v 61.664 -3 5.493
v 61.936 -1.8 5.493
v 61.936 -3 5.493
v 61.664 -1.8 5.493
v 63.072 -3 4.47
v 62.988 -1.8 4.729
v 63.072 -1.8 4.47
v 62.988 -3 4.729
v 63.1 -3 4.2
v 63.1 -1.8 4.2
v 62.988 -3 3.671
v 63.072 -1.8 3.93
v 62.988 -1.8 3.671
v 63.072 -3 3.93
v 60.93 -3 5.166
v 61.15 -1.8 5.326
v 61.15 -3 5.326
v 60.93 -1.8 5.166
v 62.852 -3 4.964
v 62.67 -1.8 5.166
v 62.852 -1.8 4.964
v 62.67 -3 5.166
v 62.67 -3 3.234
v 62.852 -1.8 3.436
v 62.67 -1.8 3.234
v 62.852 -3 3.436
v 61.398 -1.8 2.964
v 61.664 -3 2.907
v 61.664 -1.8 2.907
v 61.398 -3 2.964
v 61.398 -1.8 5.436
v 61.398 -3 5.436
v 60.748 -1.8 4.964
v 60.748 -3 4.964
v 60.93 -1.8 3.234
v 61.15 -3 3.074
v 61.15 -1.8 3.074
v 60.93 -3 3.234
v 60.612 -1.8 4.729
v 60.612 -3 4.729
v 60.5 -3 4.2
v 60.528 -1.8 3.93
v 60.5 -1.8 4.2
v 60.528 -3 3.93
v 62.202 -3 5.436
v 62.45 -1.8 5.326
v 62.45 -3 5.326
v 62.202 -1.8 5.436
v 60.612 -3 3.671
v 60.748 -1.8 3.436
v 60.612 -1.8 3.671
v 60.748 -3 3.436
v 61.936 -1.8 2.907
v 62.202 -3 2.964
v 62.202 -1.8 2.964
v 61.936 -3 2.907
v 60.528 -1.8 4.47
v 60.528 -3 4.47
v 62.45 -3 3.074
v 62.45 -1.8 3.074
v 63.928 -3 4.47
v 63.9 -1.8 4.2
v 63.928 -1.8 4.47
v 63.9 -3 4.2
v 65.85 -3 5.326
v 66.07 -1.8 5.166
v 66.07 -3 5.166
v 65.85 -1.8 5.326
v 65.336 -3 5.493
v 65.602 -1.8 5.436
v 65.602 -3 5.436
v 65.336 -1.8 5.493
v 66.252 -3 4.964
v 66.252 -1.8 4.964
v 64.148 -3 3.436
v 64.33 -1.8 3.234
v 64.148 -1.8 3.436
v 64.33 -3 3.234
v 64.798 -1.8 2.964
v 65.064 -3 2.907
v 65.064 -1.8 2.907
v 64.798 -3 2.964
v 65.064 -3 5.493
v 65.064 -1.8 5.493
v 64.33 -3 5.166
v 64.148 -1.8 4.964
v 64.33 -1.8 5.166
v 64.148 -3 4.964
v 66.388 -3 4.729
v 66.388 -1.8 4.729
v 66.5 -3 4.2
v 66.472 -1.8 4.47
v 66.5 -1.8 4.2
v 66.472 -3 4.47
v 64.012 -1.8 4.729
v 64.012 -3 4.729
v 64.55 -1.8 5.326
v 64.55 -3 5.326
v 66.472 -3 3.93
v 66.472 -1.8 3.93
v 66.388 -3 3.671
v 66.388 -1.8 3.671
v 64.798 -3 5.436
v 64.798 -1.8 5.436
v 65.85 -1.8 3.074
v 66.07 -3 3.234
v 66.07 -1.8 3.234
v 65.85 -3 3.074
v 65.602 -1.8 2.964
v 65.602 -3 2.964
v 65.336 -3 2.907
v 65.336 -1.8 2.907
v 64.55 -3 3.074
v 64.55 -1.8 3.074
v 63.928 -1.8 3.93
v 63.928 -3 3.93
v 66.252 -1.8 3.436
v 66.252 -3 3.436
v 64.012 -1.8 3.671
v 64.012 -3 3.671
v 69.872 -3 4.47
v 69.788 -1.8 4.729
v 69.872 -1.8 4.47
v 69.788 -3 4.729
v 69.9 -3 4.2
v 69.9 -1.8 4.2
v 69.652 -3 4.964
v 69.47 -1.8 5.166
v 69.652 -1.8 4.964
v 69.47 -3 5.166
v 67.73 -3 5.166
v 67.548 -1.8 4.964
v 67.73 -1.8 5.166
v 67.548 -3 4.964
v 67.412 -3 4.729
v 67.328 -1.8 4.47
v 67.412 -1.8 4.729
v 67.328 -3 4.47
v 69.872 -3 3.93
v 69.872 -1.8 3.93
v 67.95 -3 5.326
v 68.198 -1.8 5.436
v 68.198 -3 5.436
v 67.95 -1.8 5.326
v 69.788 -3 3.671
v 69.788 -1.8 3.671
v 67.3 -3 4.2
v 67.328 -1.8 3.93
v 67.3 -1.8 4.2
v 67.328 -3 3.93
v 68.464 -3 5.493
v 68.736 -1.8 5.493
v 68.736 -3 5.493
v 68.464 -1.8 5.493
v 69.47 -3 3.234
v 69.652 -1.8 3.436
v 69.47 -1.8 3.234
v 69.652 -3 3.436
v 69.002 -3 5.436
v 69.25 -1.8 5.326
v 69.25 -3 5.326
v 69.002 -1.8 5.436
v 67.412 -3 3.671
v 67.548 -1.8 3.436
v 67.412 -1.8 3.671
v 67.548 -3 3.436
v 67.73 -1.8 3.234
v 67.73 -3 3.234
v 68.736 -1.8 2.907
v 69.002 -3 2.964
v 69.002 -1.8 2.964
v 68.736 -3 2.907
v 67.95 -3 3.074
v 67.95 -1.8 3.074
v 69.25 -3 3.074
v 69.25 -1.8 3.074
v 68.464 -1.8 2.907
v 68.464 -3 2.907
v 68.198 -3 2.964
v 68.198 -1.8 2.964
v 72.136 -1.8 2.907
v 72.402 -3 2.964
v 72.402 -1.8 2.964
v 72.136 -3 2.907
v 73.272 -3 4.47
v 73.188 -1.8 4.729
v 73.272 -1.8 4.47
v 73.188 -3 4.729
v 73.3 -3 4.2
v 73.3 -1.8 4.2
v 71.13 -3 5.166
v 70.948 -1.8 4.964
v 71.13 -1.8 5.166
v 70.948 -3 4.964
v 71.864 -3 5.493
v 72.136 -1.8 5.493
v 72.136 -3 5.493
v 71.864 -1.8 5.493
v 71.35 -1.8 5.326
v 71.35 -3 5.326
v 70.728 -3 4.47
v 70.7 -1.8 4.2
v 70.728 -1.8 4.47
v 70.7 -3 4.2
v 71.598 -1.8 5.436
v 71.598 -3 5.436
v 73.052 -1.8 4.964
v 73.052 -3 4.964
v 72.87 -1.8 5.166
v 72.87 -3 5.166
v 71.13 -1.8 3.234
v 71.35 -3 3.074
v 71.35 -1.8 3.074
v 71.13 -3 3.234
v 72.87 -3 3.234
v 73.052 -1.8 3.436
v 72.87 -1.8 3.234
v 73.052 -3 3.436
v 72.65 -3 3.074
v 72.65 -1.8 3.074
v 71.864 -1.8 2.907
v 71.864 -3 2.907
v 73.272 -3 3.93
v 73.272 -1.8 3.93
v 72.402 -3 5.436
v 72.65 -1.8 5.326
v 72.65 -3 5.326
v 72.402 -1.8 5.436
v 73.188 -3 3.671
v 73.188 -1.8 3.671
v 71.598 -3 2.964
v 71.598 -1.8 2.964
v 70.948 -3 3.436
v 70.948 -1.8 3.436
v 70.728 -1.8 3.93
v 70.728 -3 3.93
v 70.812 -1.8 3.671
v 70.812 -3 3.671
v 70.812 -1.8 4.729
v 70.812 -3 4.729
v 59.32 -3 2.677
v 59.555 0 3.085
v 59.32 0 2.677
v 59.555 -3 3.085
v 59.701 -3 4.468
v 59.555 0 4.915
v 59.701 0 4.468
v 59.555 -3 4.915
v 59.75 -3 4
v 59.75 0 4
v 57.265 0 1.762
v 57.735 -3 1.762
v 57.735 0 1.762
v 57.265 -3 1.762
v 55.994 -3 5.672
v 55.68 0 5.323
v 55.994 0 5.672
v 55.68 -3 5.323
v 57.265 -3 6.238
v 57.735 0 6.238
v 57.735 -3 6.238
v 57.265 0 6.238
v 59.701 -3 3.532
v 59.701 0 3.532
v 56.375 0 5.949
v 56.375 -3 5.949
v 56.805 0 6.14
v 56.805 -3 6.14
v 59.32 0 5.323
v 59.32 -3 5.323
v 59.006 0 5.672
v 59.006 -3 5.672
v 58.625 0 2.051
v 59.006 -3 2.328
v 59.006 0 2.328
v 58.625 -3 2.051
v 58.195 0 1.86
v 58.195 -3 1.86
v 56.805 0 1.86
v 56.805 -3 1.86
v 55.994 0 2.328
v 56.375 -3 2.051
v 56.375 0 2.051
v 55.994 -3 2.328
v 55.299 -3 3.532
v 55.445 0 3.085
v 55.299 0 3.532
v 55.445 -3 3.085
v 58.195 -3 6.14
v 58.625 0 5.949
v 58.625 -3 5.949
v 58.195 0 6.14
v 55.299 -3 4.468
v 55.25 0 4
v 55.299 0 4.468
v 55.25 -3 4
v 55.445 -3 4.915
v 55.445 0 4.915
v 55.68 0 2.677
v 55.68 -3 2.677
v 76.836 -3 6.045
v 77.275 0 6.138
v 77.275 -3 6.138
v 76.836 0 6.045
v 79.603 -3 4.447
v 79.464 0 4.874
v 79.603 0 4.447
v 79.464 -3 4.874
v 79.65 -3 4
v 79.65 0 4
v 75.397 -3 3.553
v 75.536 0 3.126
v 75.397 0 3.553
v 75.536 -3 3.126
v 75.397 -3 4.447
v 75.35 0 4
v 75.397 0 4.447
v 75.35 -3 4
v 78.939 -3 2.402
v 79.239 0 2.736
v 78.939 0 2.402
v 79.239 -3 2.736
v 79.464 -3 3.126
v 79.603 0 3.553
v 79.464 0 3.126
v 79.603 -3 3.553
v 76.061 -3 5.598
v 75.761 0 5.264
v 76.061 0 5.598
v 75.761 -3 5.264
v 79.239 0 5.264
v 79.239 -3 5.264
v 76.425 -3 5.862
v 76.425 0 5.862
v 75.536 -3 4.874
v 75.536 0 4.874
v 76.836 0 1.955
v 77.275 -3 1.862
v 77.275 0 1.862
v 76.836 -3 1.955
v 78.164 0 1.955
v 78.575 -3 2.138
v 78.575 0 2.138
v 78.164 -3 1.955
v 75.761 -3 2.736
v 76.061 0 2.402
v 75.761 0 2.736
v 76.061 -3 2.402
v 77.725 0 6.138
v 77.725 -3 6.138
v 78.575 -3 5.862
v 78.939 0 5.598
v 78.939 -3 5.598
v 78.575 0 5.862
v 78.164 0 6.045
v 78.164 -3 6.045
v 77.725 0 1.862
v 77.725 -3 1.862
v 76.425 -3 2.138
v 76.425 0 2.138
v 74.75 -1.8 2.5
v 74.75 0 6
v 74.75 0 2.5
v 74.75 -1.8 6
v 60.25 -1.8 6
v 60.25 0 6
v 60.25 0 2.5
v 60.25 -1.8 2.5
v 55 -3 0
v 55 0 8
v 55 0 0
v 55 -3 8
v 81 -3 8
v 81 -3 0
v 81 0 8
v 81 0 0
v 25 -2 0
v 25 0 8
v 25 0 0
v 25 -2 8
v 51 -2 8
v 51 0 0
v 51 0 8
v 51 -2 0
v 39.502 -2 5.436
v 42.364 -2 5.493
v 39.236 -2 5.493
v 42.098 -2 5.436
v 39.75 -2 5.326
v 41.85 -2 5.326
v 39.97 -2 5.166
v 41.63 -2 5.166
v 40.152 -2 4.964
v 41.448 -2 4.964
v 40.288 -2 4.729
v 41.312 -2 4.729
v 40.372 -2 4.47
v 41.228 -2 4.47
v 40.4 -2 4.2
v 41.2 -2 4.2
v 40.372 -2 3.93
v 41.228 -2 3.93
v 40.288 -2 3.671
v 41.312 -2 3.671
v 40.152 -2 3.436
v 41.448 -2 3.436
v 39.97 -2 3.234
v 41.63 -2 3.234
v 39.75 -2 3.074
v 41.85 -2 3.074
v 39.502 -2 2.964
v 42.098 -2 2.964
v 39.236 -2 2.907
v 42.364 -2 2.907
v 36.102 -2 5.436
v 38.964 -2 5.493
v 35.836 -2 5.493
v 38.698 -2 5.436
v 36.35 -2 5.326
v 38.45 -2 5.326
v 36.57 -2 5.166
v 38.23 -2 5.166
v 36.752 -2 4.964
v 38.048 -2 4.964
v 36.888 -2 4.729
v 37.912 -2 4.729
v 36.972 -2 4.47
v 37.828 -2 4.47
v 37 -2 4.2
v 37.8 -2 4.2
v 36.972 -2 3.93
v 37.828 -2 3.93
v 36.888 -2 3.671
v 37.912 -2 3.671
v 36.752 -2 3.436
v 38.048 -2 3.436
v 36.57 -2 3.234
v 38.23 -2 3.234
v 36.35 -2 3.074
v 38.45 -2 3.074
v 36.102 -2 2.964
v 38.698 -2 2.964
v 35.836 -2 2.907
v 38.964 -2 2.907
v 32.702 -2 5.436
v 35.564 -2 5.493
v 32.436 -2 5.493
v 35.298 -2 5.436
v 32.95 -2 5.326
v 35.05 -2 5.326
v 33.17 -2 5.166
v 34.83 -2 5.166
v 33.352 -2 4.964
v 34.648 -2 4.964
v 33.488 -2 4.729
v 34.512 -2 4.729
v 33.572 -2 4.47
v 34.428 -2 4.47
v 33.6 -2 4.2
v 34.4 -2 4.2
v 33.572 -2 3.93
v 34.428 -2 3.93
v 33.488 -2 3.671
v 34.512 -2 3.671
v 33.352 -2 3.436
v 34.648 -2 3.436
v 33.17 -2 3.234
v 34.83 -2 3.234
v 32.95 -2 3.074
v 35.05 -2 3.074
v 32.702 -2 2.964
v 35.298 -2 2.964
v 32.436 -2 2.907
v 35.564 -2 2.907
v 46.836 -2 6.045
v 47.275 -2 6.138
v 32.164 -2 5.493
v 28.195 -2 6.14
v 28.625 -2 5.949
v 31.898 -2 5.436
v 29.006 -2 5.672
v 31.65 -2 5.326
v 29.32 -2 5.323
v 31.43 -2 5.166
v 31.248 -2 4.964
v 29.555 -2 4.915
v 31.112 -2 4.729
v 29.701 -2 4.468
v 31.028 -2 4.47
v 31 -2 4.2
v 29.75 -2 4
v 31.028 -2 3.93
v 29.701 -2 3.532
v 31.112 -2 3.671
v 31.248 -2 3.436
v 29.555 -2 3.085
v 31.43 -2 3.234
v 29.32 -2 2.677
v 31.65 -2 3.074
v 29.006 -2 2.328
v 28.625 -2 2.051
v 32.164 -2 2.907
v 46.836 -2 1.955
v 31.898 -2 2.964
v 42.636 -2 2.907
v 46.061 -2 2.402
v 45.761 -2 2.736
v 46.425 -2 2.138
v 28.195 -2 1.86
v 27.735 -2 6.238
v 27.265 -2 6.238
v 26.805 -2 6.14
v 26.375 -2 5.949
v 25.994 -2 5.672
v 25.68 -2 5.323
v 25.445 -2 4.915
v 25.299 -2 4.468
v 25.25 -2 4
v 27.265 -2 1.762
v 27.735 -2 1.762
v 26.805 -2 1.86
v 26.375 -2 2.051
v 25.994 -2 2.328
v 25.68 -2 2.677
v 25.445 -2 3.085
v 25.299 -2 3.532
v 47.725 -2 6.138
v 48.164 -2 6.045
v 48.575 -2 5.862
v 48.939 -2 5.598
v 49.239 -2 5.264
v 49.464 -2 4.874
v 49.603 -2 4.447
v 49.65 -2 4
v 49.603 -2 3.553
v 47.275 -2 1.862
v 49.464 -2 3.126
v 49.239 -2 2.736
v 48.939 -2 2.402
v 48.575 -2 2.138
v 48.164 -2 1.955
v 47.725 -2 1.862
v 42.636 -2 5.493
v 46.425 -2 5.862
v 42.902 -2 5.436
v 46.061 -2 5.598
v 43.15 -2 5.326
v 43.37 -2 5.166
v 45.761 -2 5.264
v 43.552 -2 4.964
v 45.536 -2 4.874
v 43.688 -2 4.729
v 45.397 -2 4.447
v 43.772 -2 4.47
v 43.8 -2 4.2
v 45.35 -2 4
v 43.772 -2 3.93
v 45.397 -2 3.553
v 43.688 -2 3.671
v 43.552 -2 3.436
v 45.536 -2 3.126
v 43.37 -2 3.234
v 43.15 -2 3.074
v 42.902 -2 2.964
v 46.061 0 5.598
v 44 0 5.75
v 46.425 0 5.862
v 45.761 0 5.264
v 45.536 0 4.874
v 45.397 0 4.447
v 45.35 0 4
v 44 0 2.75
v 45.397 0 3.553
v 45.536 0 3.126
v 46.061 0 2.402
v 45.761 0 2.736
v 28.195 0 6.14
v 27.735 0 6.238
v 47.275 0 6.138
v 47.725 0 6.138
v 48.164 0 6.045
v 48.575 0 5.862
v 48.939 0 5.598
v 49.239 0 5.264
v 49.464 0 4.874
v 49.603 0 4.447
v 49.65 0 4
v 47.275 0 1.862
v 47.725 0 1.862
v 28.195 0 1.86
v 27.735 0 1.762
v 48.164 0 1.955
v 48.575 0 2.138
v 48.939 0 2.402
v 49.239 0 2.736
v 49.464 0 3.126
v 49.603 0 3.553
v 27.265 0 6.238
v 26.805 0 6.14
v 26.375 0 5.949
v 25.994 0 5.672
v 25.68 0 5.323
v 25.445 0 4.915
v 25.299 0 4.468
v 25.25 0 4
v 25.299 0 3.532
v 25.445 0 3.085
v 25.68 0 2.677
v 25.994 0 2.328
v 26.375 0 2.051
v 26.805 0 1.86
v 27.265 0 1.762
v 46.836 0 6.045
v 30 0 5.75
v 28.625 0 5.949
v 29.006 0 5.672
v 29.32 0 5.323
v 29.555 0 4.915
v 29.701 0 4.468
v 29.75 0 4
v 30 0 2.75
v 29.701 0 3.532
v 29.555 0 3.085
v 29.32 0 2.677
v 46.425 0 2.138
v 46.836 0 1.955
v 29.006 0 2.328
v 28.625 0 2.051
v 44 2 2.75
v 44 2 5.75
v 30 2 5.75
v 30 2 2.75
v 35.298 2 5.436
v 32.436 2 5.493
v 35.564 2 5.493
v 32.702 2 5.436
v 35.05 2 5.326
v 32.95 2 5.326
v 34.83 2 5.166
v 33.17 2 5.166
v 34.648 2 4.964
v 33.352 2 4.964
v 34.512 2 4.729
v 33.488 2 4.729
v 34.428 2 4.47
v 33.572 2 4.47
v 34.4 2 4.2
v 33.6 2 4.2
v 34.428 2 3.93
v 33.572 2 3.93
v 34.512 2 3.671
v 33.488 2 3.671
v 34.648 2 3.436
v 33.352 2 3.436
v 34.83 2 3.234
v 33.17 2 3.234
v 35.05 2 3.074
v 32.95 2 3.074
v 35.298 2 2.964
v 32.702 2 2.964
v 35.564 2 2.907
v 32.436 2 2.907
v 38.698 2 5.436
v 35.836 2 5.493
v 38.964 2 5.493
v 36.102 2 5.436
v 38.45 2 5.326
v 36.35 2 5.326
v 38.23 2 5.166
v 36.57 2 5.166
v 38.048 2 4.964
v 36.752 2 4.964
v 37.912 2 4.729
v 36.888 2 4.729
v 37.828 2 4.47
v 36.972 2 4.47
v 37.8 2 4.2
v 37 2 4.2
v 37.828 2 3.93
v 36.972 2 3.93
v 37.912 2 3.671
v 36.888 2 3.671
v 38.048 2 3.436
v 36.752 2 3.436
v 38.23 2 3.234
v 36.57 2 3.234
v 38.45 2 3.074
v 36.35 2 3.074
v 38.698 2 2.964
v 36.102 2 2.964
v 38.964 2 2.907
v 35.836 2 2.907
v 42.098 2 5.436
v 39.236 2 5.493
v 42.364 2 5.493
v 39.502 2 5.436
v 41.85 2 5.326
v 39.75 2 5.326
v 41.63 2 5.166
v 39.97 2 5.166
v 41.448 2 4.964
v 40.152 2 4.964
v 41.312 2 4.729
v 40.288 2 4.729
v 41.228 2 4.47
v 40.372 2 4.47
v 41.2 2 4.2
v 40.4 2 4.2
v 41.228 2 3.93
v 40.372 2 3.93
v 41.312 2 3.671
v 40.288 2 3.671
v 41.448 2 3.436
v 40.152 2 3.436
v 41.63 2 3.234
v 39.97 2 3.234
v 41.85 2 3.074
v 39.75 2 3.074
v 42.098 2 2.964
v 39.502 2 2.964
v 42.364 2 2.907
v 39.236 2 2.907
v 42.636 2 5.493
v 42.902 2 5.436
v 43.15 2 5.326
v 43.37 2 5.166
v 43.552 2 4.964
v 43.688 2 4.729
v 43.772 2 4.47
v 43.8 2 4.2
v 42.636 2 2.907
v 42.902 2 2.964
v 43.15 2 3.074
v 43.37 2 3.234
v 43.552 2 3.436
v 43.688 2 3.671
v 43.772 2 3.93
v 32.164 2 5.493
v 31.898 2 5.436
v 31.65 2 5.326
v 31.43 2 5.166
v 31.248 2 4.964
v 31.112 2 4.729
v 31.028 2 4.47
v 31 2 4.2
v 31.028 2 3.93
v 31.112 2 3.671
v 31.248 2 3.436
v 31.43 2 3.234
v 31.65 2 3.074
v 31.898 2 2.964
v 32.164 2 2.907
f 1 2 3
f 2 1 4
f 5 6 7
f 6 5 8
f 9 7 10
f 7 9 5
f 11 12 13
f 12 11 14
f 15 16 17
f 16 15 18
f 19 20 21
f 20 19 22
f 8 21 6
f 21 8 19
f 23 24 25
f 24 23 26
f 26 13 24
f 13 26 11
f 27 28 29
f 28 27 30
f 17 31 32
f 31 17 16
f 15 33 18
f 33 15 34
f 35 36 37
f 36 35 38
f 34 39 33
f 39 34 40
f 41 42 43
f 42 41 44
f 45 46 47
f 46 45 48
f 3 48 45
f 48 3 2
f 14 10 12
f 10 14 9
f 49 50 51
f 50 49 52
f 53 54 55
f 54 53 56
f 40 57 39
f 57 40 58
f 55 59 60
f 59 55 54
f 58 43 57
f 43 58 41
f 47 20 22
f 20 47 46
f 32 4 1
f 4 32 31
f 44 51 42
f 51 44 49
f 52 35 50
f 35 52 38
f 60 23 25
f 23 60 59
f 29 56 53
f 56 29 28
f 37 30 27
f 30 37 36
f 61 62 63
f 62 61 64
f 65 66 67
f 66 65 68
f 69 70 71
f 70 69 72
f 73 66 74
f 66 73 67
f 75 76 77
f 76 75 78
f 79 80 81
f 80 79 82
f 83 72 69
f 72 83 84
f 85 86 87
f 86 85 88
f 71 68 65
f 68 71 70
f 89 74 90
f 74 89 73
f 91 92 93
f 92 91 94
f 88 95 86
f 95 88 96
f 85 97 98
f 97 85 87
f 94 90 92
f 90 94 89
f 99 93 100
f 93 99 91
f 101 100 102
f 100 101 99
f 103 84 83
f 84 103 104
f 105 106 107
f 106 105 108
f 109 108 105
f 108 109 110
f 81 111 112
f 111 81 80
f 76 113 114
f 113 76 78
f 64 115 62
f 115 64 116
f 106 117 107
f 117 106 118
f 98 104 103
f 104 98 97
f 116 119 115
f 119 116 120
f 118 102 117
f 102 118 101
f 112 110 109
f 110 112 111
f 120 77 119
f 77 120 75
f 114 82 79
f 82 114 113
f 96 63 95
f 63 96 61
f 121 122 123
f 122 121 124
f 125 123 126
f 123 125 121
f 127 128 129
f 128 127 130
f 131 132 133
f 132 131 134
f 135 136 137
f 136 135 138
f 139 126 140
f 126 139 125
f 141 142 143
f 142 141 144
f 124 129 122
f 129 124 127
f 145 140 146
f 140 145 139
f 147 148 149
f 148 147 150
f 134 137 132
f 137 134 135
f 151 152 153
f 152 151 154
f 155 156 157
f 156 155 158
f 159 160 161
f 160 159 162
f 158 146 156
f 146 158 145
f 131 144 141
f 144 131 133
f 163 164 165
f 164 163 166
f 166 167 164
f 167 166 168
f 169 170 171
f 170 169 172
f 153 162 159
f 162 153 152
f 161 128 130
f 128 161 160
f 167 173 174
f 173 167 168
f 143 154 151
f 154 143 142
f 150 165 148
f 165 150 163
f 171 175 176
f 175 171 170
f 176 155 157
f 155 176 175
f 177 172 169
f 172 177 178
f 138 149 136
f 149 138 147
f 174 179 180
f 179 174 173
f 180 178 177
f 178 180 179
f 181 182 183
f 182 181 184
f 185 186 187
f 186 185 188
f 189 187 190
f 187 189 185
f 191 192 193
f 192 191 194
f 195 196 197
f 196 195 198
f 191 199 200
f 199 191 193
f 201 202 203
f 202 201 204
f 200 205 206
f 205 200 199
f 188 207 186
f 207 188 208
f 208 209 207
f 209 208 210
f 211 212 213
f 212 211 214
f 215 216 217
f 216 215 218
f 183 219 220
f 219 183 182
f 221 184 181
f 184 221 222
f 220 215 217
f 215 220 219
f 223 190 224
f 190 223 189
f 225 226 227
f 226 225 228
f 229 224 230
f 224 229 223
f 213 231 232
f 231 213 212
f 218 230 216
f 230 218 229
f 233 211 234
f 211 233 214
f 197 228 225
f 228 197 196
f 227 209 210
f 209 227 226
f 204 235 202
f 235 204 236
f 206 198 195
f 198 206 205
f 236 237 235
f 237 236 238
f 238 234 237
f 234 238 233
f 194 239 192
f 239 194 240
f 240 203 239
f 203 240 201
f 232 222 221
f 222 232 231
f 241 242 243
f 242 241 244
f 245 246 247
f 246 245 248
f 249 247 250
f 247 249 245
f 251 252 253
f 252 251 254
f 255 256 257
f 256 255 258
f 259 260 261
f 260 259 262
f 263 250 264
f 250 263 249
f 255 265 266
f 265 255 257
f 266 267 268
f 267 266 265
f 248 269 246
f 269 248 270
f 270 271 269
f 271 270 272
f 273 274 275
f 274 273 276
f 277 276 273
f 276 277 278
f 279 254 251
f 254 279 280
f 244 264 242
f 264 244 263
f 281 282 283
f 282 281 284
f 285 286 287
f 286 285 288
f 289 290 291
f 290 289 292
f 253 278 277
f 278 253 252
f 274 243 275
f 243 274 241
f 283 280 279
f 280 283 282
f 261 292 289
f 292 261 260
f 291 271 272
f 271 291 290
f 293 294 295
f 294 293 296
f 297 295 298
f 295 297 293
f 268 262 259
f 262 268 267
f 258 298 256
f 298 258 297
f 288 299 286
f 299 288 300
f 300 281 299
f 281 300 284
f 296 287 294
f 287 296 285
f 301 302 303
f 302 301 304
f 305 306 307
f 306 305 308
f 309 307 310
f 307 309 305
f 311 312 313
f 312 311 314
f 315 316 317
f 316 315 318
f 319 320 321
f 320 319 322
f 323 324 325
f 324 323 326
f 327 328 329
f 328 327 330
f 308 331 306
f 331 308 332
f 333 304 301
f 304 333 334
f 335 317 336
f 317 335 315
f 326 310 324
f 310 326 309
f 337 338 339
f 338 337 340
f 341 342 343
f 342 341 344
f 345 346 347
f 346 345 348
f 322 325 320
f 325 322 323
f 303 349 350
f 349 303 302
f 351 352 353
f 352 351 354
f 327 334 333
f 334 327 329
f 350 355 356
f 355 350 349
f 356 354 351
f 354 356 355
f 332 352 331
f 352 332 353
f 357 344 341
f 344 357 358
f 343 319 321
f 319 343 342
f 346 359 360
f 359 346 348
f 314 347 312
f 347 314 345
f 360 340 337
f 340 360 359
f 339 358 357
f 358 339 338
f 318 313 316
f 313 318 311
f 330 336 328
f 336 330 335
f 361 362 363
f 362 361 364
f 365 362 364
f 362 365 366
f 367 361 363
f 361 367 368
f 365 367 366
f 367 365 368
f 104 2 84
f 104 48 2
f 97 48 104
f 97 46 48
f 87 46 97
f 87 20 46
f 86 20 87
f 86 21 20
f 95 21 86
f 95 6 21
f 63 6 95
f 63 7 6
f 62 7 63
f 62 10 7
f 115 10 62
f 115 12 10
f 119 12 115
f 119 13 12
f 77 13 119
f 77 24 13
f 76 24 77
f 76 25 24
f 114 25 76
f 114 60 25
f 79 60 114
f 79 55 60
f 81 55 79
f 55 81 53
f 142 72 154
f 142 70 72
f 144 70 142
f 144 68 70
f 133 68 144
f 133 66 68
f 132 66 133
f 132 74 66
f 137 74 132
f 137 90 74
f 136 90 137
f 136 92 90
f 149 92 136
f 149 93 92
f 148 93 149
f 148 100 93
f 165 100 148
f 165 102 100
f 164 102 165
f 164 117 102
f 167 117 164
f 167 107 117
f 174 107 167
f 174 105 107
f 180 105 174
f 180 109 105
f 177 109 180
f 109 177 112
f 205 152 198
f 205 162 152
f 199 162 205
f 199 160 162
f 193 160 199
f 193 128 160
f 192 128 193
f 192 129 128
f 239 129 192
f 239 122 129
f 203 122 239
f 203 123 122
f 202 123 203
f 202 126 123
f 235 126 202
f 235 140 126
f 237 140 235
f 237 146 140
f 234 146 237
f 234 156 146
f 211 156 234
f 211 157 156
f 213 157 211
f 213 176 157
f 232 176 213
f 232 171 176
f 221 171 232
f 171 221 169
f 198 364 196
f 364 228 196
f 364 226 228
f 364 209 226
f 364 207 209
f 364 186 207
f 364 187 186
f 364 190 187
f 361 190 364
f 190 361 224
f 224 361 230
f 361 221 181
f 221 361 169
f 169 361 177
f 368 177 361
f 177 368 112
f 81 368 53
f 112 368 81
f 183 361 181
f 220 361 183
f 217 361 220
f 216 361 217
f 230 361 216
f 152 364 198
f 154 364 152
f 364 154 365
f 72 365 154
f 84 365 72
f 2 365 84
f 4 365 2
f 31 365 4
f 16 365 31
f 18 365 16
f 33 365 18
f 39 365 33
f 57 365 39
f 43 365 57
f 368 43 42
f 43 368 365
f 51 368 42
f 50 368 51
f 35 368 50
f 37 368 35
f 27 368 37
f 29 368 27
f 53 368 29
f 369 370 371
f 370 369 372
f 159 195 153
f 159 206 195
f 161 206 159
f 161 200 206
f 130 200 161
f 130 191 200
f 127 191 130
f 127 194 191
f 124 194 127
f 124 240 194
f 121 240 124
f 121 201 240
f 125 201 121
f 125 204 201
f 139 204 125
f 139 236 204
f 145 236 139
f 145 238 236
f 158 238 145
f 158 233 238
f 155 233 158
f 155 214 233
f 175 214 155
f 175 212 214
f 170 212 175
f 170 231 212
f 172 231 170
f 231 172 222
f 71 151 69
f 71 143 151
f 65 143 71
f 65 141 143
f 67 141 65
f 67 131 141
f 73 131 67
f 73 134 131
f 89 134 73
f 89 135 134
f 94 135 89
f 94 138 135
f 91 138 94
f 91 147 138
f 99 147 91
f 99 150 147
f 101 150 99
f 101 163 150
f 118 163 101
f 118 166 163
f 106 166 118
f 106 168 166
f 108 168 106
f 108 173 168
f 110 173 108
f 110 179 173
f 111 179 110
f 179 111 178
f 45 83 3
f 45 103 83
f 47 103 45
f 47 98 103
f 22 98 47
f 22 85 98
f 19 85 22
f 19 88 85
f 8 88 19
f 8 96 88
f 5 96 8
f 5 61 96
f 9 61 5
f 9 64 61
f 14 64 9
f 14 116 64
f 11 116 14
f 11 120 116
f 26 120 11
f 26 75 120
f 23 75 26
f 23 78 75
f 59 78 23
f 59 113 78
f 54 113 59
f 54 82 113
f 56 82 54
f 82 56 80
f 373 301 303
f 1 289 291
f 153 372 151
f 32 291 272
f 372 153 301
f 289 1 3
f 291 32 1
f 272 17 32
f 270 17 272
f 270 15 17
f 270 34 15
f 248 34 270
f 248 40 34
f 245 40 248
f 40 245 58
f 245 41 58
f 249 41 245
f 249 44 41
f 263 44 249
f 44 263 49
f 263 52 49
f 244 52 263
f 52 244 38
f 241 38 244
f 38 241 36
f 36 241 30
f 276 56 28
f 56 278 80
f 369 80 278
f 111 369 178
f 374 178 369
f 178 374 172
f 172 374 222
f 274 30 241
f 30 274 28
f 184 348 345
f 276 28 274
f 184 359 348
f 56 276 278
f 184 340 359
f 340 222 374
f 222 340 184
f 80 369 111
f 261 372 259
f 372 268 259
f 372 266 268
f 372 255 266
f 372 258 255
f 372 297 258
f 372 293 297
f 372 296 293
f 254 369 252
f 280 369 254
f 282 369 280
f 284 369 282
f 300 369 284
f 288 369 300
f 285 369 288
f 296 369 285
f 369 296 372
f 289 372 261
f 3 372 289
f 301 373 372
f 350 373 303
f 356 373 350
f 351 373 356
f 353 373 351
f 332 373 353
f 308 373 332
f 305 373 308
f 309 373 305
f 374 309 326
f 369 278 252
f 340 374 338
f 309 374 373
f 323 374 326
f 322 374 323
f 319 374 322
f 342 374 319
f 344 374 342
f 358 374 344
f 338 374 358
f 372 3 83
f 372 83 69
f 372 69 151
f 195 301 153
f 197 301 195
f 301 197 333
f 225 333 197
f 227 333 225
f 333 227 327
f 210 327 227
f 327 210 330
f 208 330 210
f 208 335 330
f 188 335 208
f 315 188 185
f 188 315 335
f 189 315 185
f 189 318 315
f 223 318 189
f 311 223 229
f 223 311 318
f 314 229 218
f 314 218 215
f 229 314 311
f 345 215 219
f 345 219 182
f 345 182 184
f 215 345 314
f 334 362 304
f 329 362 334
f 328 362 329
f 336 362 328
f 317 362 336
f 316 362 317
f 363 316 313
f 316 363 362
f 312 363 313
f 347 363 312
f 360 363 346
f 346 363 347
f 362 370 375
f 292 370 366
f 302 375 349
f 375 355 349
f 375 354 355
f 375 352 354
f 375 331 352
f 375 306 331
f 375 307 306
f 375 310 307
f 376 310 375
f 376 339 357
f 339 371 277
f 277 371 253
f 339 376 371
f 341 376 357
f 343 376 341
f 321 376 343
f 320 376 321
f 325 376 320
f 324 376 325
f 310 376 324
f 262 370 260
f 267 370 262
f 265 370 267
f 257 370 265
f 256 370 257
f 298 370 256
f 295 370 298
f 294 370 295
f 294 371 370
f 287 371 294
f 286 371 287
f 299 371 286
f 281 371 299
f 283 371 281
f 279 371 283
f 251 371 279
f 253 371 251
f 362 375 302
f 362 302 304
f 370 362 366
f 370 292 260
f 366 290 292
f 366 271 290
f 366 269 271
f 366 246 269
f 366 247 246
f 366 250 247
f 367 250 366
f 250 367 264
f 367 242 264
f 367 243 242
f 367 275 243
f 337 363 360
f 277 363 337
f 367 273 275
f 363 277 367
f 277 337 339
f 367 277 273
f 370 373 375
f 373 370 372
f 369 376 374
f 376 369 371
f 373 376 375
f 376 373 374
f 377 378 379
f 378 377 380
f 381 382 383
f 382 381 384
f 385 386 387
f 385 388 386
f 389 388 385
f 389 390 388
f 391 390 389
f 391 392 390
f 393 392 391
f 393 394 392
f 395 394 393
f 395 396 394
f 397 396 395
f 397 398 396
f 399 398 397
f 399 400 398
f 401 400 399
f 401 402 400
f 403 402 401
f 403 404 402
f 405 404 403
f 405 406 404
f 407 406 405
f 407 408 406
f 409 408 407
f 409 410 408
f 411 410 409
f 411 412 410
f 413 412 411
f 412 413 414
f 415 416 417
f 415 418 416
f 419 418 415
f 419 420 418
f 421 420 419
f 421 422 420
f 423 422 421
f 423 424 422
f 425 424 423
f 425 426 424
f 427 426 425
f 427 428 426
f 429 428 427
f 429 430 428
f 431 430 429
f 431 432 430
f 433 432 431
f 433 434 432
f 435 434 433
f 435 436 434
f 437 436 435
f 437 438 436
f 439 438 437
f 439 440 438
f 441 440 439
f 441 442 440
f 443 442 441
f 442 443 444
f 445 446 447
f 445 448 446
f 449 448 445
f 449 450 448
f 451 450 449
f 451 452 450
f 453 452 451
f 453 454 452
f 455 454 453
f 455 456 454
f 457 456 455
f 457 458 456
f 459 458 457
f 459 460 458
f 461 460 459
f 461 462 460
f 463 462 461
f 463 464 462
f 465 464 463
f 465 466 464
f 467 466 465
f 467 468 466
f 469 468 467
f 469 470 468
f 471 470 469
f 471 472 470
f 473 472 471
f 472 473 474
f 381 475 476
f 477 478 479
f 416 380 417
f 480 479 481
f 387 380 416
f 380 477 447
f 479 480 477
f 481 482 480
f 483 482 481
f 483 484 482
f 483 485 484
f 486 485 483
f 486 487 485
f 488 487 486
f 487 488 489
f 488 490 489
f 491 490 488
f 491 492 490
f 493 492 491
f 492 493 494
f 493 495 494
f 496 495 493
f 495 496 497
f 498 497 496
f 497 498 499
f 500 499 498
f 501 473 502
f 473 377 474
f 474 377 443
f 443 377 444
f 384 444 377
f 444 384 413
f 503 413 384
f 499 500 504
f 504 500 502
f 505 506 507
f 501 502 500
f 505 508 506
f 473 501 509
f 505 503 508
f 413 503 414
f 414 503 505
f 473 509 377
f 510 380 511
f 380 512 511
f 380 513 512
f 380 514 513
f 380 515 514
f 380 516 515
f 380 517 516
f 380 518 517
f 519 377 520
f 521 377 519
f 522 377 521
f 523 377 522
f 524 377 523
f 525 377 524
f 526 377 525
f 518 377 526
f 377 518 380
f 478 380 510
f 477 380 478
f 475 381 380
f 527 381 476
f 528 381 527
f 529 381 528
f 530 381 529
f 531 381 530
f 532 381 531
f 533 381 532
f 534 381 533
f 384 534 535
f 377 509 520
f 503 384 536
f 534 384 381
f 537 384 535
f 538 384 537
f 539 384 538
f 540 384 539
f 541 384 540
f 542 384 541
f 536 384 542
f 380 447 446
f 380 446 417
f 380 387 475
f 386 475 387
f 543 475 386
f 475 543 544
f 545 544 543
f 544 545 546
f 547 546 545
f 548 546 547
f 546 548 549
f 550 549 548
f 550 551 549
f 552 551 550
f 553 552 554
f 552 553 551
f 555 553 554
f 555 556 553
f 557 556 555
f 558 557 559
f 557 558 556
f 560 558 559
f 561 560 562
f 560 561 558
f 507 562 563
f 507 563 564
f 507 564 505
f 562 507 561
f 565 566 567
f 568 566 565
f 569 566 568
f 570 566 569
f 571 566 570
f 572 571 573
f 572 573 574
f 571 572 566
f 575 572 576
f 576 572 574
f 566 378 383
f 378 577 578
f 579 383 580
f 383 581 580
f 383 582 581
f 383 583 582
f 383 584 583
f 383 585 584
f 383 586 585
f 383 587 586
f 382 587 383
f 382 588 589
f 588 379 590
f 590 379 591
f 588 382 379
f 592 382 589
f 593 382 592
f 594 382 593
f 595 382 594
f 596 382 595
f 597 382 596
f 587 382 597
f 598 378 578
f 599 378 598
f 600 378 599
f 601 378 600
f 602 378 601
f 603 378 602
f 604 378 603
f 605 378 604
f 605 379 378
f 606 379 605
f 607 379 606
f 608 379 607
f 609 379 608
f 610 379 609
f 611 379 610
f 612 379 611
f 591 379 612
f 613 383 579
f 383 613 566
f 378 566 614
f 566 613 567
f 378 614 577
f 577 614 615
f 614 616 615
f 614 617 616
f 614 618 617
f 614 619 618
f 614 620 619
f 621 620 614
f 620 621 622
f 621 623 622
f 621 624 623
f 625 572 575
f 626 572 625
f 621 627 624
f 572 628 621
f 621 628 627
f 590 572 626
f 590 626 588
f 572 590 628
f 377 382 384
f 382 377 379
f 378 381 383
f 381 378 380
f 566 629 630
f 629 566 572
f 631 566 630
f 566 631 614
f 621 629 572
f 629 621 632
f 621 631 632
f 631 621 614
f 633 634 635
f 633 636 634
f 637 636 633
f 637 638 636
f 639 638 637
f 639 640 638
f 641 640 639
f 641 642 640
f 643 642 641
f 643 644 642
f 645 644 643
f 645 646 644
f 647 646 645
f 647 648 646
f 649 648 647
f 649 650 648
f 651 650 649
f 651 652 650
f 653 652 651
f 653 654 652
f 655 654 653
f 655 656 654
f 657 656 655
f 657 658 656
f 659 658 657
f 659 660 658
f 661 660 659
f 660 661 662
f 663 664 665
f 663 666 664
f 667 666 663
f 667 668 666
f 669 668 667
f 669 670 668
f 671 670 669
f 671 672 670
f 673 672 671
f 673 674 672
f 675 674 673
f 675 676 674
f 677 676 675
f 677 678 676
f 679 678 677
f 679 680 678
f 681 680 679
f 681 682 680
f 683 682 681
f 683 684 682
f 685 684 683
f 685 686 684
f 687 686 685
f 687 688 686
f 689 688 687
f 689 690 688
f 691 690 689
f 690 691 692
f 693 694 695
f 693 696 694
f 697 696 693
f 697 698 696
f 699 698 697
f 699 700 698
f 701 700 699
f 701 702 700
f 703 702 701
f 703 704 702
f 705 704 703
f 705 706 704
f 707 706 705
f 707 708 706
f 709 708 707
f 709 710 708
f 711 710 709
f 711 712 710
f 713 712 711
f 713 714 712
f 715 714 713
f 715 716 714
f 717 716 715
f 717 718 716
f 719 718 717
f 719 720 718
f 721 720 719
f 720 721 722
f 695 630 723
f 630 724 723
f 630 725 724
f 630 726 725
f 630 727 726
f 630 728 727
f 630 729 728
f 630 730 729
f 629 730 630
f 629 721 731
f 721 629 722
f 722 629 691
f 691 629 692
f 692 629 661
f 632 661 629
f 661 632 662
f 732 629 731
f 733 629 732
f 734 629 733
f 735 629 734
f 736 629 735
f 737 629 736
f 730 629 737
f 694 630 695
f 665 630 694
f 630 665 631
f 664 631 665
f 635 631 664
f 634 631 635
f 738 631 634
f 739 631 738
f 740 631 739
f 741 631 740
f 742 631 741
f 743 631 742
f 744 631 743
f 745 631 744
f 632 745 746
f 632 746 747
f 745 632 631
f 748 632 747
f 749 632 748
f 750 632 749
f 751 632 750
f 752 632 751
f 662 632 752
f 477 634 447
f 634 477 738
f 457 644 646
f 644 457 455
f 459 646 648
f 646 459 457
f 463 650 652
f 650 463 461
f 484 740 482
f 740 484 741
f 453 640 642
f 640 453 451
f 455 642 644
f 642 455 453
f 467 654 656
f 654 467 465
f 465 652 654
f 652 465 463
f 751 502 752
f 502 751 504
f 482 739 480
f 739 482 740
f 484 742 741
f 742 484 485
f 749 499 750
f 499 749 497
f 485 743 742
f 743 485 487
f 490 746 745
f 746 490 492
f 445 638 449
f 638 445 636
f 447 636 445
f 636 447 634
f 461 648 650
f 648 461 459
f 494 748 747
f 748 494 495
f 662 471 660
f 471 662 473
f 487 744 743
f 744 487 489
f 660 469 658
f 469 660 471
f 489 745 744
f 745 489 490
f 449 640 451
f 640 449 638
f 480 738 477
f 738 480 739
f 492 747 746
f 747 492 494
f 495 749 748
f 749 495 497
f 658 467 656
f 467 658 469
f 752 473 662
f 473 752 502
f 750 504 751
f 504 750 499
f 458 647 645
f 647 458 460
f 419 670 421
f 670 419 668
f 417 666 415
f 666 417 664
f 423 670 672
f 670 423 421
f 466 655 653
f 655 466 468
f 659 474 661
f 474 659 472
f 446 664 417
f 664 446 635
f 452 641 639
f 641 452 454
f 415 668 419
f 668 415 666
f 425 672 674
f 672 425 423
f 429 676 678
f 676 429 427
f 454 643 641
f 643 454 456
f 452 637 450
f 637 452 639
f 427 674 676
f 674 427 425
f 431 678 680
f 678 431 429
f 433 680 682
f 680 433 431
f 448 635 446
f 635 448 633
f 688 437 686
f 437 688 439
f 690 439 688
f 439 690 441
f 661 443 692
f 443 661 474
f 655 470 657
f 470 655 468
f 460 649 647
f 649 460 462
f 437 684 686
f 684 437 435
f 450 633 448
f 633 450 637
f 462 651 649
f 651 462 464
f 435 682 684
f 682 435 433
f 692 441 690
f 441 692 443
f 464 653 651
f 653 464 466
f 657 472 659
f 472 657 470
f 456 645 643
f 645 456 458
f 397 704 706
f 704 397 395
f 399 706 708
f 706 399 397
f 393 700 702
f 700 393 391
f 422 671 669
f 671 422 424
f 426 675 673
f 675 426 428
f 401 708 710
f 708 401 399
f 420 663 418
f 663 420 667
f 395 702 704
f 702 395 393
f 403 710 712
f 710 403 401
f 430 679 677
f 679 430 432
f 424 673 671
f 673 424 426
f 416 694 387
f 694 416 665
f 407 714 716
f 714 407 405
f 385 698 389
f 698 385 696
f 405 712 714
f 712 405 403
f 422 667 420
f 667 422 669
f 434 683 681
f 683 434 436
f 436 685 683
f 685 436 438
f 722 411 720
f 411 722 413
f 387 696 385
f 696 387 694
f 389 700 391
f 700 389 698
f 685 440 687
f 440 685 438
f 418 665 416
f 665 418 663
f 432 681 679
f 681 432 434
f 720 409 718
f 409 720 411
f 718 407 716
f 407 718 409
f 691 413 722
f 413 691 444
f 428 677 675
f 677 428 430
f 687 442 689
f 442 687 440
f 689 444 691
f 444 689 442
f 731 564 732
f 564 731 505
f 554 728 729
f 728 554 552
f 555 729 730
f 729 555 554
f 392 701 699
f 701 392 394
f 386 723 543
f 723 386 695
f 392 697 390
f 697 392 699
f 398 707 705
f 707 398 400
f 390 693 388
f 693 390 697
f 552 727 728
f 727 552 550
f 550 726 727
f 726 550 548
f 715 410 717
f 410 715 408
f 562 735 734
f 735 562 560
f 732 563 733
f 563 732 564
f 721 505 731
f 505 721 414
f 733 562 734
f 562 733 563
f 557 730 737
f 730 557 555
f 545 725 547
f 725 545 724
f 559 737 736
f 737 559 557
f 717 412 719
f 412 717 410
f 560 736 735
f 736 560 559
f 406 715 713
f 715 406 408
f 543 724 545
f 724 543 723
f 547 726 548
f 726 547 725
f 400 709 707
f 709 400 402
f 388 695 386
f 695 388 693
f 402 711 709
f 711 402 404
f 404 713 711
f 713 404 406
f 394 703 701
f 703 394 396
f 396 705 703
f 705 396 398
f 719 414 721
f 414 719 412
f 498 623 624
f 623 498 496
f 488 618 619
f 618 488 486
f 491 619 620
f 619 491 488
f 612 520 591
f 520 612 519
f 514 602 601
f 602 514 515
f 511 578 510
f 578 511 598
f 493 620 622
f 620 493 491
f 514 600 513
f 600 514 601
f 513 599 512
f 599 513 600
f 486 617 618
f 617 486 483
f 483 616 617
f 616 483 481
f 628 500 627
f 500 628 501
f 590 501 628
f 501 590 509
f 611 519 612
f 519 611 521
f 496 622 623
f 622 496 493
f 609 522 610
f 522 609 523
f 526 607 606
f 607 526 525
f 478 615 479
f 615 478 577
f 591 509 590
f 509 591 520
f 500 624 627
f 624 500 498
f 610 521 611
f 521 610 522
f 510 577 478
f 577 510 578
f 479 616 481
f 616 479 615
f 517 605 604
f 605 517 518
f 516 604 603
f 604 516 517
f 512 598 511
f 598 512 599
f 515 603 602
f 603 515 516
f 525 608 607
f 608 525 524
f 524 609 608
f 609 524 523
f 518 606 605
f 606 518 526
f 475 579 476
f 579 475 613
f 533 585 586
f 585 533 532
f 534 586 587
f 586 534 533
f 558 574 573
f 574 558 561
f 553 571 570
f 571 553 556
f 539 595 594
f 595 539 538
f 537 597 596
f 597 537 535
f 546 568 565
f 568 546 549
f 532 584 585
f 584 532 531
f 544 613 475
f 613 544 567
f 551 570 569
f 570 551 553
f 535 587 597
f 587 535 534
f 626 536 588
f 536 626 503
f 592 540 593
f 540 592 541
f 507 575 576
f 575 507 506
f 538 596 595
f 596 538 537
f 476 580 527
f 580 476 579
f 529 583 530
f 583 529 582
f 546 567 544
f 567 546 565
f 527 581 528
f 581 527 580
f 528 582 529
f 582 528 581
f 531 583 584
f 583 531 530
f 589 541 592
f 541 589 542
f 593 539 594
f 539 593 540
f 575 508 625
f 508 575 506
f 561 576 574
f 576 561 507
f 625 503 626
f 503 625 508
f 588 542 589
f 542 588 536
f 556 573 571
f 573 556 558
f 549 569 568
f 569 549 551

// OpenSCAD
/*

__________ ____ ___  _____________  __.___.____    .____     
\______   \    |   \/   _____/    |/ _|   |    |   |    |    
 |    |  _/    |   /\_____  \|      < |   |    |   |    |    
 |    |   \    |  / /        \    |  \|   |    |___|    |___ 
 |_______ /______/ /_______  / ___|__ \___|_______ \_______ \
                              \/     \/           \/       \/
                                                  \/       \/                  

*/
/*                      
Buskill USB-A Magnetic breakaway Shell Assembly     
GNU General Public License v3.0 
Author: Melanie Allen
*/



/*
Description

BusKill is a Dead Man Switch triggered when a magnetic breakaway is tripped, severing a USB connection. This design is for USB-A.

The user will have a USB, a USB extension cable, and the magnetic breakaway. 

The "release" is connected to a USB extension cord that terminates with the female USB port that receives a USB.  It contains 4 pogo pins directly soldered to the female usb port and 1 oval magnet. It separates from the release when the cord is pulled. (red)

The "breakaway" is connected to the cord that terminates with the male USB and inserts the computer. It contains 4 pins terminating in pogo receptors and 1 round  magnet and a plastic case. (pink)

When the magnets on the breakaway and release connect, the pogo pins and pogo receptors must meet and establish the USB connection.

The breakaway and release plugs must be designed asymmetrically to prevent the connection from happening the wrong way. 

In this version I have borrowed these mangets and pogo receptors from the Supplier verison of the BusKill cable.

docs.buskill.in
buskill.in
*/



//magnet variables

//release magnet

magnet_position_x=3;
magnet_position_z=18.1;
magnet_position_y=4;
magnet_distance=20;

//breakaway magnet

//USB_port variables
u_h = 14.2;
u_w = 13.5;
u_d = 5.7;

//pogo variables

pogo_length=7.6;
pogo_diameter=2.6; //+.3 +.2 +.2 +.2
pogo_distance=.8; //distance between pins 
shift=2; //distance from pins 
shift2=2; //distance from top

//receptor variables

//breakaway variables
i_h = 26; //x
i_w = 8; //z
i_d = 20; //y

//release variables
i_l_h =i_h; //x
i_l_w = i_w; //z
i_l_d = 20; //y

//pogo pins

module pogos(){
    translate([-.7,-.1,4.2]){
        translate([shift,0,0])rotate ([90,0,0])cylinder($fn = 30, $fa = 30, $fs = 2, h=pogo_length, r1=pogo_diameter/2, r2=pogo_diameter/2, center = true);
    translate([pogo_distance+pogo_diameter+shift,0,0])rotate ([90,0,0])cylinder($fn = 30, $fa = 30, $fs = 1.8, h=pogo_length, r1=pogo_diameter/2, r2=pogo_diameter/2, center = true);
            translate([(pogo_distance+pogo_diameter)*2+shift,0,0])rotate ([90,0,0])cylinder($fn = 30, $fa = 30, $fs = 2, h=pogo_length, r1=pogo_diameter/2, r2=pogo_diameter/2, center = true);
    translate([(pogo_distance+pogo_diameter)*3+shift,0,0])rotate ([90,0,0])cylinder($fn = 30, $fa = 30, $fs = 1.8, h=pogo_length, r1=pogo_diameter/2, r2=pogo_diameter/2, center = true);
}
}

//pogos();

module usb(){
    color("grey",.1)translate([-1,3.8,0])cube(size = [u_h,u_w,u_d],center=false);
}

//usb();
//pogo receptors

module recs(){

}

//recs();

magnet_tolerance= .1;

module magnet(){
color("grey") rotate ([90,0,0])translate([magnet_position_x,magnet_position_y,magnet_position_z])cylinder($fn = 30, $fa = 30, $fs = 2, h=4, r1=2.15+magnet_tolerance, r2=2.15+magnet_tolerance, center = true);
    
   color("grey") rotate ([90,0,0])translate([magnet_position_x+magnet_distance,magnet_position_y,magnet_position_z])cylinder($fn = 30, $fa = 30, $fs = 2, h=4, r1=2.15, r2=2.15, center = true);
    

}

//magnet();

//

x=1;
y=0;
module void(){
    
usb();
    translate([x,y,0])pogos();
translate([-5.5,17,0])magnet();
}

// void();


module void2(){
translate([30+x,y,0])pogos();
translate([24.5,17,0])magnet();
}
//void2();

/* * Blocks * */

    module release_block(){
       
    color("Red",.55)
 rotate([90,0,0]){
{
                cube(size = [i_l_h, i_l_w, i_l_d], center = false);
            }
        } 
    } 
 
   // release_block();
   module assemble3(){ 
    difference(){
       release_block();
    translate([5,-i_l_d+3,0])void();


}

 //translate([5,-i_l_d+3,0])void();
}

//outie block

pogo_house_x = 14;
pogo_house_y = 2;
pogo_house_z =3;
pogo_house_pos_x= 30;
pogo_house_pos_y= 0;
pogo_house_pos_z= 2.75;


block_distance=25;    
        module breakaway_block(){
    color("Pink",.55)
 rotate([90,0,0]){
            translate([block_distance,0,0]){
                cube(size = [i_h, i_w, 2], center = false);
            }
        } 
    translate([pogo_house_pos_x,pogo_house_pos_y,pogo_house_pos_z])cube(size = [pogo_house_x,pogo_house_y,pogo_house_z], center=false);
        } 
  //breakaway_block();
        
     
 
 //innie block

innie_tolerance=.5;         
        
 block_distance2=25;    
        module breakaway_block2(){
    color("purple",.55)
 translate([25,0,0])rotate([90,0,0]){
            translate([block_distance2,0,0]){
                cube(size = [i_h, i_w, 3], center = false);
            }
        } 
        }        
//breakaway_block2();
     
 pogo_house2_pos_x= pogo_house_pos_x+25.5;
 pogo_house2_pos_y= pogo_house_pos_y-1.8;
 pogo_house2_pos_z= pogo_house_pos_z;  
        
 module void3(){
     translate([pogo_house2_pos_x-(innie_tolerance*.5),pogo_house2_pos_y,pogo_house2_pos_z-(innie_tolerance*.5)])cube(size = [pogo_house_x+innie_tolerance,pogo_house_y+innie_tolerance,pogo_house_z+innie_tolerance], center=false);
     translate([55.5,-2.6,0])pogos();
     translate([49.5,16.5,0])magnet();
     }    
        
//void3();    
 
 module assemble2(){
 difference(){
 breakaway_block2();
 void3();
 }    
 }
 translate([5,0,0])assemble2();
    
module assemble(){
translate([0,0,0])difference(){
      breakaway_block();
    void2();
   
}
}

assemble();   
